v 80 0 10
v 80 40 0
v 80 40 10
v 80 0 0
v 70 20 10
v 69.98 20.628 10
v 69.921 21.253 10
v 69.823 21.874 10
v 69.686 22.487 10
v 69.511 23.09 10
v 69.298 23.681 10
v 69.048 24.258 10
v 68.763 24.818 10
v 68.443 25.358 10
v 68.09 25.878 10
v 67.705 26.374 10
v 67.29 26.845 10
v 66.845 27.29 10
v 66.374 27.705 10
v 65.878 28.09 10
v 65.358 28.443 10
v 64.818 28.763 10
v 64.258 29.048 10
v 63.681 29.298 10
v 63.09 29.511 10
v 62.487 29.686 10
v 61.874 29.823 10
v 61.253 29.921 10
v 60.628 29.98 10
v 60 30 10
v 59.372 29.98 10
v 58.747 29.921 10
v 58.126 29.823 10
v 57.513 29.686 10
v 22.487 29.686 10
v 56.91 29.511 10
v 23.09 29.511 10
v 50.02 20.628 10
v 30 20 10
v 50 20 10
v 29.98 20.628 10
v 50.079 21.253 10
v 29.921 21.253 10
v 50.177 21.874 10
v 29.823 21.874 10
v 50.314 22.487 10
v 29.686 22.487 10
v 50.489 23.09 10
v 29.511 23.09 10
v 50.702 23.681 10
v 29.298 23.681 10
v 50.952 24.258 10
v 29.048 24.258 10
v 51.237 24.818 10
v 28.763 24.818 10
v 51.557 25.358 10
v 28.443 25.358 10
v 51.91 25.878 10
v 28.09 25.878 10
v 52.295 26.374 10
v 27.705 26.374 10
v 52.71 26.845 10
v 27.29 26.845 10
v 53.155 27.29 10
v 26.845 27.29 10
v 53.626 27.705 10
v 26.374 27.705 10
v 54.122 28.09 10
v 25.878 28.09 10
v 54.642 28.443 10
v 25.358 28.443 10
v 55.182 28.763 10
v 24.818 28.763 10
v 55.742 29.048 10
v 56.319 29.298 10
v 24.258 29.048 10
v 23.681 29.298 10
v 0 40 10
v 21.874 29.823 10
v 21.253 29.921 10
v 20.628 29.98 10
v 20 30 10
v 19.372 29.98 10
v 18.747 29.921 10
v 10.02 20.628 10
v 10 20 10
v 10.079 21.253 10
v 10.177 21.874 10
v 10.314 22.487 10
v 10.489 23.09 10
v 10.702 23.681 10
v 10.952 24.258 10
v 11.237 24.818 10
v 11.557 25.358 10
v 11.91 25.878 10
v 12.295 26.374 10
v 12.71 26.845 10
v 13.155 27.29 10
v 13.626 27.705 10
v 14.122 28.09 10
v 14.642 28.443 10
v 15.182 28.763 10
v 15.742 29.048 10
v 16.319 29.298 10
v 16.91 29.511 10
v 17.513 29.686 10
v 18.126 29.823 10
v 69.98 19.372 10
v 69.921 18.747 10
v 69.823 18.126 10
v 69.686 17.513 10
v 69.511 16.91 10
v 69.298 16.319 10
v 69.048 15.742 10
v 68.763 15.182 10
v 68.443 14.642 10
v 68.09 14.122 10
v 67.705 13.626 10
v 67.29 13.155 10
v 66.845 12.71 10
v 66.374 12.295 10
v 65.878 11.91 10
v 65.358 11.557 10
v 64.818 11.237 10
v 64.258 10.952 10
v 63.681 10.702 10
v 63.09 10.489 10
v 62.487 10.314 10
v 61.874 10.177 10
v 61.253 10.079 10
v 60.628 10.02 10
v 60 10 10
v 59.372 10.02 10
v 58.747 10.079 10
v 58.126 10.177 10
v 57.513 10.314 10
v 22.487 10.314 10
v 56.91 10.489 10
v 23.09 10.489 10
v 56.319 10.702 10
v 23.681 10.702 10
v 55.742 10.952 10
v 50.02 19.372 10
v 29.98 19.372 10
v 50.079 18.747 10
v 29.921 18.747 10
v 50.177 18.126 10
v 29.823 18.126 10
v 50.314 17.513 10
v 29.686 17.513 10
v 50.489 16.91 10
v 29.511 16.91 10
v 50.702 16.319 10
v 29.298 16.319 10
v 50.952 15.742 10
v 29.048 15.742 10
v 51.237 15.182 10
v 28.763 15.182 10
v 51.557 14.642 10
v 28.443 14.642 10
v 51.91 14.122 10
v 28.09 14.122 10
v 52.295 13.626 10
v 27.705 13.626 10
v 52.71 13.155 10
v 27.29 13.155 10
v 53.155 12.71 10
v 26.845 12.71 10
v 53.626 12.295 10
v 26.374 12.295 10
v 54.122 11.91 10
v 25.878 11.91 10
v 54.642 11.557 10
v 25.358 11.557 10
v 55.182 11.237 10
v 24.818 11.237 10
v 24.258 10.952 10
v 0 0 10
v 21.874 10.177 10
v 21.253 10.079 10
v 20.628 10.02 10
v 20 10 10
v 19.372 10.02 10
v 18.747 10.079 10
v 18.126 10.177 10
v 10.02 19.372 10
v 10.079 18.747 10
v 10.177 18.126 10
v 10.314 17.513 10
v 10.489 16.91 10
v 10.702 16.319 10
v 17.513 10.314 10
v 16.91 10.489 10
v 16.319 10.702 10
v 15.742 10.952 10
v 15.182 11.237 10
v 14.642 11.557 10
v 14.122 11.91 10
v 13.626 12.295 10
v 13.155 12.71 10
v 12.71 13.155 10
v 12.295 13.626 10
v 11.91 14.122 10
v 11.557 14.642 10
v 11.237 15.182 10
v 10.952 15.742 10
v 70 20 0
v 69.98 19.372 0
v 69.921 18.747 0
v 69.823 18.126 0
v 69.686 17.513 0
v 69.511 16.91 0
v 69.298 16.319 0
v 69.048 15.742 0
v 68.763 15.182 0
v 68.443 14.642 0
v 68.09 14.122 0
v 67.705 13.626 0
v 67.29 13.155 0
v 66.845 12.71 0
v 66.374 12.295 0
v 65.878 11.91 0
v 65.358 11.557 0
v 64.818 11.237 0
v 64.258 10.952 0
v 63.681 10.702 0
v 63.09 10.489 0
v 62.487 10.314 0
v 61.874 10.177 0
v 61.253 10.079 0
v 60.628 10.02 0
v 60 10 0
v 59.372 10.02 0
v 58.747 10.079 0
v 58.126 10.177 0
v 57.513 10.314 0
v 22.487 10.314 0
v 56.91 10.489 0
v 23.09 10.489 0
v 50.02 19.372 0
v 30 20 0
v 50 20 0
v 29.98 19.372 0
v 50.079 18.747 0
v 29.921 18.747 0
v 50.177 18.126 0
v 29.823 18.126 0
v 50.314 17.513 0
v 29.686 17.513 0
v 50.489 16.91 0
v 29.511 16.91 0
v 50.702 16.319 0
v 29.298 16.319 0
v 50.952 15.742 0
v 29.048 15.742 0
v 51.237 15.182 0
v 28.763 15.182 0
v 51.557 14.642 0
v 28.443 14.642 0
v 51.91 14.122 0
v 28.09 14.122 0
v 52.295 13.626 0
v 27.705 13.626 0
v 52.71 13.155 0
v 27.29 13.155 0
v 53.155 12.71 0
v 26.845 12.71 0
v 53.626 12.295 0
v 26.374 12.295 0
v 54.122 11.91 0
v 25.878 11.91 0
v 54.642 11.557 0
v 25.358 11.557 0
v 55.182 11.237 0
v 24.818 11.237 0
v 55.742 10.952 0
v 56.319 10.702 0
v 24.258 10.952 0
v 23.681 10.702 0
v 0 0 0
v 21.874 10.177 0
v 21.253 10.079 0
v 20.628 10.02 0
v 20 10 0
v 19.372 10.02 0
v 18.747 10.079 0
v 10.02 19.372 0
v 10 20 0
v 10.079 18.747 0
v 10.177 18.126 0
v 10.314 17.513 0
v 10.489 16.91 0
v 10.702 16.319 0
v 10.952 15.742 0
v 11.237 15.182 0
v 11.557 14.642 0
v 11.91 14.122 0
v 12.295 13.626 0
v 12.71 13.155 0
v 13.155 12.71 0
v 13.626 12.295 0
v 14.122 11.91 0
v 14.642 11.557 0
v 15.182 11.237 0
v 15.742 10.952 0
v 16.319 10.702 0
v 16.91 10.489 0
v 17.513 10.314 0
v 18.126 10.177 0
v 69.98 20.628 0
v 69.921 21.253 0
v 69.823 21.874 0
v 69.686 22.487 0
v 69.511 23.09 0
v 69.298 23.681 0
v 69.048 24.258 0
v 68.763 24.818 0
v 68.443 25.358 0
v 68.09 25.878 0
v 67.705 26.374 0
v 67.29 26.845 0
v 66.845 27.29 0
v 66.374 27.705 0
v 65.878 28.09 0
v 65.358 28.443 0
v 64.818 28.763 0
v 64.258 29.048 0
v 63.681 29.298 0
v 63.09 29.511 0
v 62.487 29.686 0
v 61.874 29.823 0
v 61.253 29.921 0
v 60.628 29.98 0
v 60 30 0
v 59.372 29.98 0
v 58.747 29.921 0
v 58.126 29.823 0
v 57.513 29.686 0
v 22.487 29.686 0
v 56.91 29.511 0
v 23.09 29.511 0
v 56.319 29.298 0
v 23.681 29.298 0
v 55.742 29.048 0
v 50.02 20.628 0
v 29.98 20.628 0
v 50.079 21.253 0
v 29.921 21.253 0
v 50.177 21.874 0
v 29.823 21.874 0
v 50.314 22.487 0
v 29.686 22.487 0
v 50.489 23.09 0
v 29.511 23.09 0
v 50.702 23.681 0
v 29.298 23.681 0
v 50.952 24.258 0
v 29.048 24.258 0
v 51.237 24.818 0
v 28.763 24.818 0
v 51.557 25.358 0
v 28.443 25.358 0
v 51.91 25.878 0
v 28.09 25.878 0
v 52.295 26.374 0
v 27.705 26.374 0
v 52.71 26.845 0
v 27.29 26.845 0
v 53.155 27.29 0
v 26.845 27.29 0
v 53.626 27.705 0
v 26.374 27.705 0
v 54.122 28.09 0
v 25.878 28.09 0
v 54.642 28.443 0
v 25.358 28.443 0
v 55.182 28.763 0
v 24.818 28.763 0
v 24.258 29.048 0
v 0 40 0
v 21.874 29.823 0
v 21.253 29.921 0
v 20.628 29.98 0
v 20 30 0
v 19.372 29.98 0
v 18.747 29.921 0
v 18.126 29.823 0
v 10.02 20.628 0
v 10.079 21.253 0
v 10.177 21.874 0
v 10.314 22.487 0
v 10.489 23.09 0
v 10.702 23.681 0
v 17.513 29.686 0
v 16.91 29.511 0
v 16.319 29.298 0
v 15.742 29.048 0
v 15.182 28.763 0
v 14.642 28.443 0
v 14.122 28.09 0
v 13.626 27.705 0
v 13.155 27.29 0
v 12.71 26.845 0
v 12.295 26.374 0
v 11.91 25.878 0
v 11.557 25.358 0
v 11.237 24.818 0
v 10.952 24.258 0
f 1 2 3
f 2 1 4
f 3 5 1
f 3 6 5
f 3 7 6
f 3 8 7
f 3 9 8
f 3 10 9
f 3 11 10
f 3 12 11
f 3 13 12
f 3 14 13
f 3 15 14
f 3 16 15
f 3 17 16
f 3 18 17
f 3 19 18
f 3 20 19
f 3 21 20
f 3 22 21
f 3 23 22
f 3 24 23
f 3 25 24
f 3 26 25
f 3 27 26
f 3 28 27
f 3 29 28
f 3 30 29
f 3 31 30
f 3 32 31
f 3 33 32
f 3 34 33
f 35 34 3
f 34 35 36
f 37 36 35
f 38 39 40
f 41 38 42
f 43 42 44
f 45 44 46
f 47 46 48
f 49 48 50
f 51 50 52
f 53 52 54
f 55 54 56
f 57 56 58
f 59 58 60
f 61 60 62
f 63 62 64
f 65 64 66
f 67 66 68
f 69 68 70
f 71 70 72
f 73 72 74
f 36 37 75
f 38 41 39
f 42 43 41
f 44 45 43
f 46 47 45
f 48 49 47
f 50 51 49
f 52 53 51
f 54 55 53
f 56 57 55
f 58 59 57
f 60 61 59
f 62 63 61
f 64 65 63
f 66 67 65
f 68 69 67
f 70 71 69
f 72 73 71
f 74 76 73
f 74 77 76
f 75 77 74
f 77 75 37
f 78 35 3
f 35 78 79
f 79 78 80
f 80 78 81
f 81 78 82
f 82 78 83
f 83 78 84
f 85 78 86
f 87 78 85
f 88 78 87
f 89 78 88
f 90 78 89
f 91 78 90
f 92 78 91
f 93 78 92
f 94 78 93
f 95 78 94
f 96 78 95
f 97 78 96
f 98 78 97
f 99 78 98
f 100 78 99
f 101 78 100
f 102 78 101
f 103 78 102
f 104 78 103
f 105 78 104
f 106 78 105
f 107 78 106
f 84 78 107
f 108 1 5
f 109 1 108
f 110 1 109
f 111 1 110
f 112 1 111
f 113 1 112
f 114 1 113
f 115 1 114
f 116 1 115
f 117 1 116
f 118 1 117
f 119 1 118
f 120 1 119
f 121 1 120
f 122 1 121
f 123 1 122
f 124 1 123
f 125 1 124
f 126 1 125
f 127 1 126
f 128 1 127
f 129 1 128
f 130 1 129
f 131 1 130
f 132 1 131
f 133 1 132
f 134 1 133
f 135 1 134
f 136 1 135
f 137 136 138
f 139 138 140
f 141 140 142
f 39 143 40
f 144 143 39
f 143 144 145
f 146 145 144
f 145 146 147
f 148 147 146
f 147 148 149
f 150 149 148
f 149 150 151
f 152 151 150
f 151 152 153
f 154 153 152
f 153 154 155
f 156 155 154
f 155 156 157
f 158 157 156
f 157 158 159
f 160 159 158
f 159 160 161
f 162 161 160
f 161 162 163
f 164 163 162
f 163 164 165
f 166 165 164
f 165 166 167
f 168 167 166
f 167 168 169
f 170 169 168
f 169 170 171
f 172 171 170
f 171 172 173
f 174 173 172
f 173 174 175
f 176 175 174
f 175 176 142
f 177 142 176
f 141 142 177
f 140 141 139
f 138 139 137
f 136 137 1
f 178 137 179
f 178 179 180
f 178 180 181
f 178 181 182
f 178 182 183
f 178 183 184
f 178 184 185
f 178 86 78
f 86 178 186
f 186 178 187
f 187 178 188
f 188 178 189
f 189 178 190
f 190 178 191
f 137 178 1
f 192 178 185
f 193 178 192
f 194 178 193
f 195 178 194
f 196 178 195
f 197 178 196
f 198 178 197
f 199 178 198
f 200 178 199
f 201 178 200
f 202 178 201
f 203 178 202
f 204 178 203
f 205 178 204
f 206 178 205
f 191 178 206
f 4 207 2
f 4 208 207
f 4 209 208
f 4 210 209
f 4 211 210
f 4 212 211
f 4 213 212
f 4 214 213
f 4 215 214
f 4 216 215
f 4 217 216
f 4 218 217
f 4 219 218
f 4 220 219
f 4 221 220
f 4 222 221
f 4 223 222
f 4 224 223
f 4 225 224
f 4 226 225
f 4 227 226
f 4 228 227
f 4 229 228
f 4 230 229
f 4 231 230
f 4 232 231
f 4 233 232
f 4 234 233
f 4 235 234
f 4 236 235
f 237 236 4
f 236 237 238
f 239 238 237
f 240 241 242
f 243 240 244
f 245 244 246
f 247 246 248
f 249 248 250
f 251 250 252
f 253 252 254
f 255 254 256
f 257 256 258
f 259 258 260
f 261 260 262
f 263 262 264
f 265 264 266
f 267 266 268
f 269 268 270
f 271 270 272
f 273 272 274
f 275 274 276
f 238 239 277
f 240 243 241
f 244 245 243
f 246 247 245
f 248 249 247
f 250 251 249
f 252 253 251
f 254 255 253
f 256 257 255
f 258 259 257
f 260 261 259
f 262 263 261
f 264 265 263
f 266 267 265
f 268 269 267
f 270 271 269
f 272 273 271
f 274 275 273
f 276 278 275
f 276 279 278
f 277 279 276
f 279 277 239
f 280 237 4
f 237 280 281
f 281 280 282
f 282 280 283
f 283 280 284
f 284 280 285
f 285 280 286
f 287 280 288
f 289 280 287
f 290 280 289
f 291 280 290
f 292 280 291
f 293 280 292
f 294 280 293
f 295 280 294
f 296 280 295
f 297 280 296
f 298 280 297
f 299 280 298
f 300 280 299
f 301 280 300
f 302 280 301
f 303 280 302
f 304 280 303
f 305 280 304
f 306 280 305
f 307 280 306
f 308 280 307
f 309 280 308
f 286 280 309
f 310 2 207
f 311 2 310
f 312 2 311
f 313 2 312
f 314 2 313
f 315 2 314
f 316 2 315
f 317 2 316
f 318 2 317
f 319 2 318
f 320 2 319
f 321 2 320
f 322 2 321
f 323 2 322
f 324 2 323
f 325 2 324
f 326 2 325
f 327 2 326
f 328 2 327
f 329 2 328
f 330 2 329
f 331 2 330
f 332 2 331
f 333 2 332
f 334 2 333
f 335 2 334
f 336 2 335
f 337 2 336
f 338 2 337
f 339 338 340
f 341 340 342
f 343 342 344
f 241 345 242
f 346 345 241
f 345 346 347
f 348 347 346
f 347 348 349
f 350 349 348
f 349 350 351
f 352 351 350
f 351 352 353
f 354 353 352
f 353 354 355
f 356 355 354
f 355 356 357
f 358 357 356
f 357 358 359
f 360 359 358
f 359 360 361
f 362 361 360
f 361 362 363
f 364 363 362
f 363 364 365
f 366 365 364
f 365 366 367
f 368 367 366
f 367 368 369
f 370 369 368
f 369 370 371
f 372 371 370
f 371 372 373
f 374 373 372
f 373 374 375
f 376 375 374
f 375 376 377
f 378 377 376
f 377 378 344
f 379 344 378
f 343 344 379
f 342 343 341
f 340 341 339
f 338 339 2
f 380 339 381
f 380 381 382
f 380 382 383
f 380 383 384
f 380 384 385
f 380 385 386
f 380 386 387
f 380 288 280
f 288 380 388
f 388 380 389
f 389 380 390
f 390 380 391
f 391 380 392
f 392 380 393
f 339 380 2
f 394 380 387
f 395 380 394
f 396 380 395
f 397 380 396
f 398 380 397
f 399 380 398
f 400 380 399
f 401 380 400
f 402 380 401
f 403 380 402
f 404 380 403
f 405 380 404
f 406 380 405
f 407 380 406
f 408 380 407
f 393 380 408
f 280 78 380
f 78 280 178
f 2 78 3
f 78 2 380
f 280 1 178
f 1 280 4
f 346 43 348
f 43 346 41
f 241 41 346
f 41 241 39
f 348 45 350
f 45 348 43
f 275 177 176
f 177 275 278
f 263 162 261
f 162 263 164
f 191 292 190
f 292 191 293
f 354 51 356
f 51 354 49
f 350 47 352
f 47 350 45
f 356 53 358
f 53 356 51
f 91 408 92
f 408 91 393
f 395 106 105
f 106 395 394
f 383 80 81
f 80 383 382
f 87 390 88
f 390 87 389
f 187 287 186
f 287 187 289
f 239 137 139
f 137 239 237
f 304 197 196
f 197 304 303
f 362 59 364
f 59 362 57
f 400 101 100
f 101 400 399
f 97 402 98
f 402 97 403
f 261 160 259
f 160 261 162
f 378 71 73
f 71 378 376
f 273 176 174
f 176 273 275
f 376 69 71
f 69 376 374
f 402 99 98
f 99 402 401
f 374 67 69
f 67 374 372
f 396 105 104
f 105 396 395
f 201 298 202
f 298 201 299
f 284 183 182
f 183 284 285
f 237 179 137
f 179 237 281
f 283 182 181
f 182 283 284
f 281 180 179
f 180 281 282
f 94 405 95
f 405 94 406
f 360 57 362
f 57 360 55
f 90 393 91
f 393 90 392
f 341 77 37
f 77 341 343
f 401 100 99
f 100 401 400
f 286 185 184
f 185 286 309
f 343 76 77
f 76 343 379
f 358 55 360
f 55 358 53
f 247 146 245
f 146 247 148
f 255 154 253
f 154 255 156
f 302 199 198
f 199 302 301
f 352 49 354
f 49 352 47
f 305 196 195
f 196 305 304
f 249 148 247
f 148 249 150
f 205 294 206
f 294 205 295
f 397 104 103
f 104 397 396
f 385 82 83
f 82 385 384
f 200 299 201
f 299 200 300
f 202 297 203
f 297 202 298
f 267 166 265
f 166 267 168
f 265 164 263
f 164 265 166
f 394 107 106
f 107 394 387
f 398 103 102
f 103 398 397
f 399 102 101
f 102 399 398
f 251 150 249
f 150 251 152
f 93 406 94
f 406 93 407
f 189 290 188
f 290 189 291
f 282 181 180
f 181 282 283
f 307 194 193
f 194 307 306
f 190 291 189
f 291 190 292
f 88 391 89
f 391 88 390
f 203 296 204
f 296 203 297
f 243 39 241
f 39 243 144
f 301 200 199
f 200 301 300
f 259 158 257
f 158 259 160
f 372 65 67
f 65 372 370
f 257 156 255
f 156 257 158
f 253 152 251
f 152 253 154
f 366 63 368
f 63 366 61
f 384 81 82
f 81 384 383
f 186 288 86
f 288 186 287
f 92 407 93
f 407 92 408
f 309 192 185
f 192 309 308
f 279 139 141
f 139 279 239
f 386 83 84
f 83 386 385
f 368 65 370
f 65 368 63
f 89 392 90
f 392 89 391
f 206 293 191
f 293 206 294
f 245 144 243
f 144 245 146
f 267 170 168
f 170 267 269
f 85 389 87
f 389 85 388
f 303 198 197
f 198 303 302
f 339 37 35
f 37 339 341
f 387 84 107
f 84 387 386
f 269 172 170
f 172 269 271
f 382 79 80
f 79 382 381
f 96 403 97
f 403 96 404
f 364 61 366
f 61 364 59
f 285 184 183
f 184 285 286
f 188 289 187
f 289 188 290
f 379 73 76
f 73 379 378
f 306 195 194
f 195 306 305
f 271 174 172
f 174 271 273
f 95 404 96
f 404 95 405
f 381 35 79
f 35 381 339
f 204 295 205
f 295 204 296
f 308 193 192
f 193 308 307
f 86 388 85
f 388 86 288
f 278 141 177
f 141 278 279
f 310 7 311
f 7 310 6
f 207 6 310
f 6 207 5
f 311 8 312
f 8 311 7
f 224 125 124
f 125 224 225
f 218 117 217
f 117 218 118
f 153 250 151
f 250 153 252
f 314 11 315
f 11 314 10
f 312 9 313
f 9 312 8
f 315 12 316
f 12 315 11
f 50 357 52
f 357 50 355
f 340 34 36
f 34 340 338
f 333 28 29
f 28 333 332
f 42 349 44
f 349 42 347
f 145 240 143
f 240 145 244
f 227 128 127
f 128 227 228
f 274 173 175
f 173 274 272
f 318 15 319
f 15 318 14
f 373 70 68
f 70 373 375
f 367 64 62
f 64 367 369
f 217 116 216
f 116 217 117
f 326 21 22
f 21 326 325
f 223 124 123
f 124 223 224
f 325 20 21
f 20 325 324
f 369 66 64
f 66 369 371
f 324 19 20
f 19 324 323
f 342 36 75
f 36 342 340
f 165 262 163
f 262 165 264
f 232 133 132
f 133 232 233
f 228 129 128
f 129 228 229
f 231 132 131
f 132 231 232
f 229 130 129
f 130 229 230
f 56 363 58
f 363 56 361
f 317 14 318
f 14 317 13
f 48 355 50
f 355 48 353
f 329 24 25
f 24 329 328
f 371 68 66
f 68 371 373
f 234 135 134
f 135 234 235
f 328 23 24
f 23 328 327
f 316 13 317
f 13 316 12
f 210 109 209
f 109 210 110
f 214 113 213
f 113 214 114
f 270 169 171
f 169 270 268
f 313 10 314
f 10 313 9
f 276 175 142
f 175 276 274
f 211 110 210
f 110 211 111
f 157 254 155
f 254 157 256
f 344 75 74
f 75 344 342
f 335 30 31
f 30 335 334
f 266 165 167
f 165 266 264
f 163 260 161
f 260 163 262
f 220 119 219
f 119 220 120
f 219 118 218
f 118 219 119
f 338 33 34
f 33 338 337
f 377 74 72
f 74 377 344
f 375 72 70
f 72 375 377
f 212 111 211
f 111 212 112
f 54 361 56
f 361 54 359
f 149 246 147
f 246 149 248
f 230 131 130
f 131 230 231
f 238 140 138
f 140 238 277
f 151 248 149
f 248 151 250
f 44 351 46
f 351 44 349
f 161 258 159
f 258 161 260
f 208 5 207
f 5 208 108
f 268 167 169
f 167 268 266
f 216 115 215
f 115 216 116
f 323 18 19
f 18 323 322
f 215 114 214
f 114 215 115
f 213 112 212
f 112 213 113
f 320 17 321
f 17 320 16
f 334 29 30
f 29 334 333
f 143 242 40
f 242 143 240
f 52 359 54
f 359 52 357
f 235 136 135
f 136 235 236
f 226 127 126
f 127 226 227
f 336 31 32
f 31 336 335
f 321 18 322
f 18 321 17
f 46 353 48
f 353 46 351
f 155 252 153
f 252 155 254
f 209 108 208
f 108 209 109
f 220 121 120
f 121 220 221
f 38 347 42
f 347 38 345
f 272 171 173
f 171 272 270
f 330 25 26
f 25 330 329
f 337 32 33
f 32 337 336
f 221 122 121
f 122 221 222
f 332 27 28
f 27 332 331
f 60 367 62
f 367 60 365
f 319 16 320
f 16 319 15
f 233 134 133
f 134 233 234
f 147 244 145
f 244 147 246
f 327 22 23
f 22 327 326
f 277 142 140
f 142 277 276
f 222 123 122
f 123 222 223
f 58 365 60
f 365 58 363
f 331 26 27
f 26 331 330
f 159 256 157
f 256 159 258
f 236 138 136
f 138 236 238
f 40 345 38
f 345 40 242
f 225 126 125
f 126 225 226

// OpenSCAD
$fn = 100;

difference() {
    cube ([80, 40, 10]);
    translate([20, 20, -20])
    cylinder(r=10, h=50);  
    translate([60, 20, -20])
    cylinder(r=10, h=50);    
}
